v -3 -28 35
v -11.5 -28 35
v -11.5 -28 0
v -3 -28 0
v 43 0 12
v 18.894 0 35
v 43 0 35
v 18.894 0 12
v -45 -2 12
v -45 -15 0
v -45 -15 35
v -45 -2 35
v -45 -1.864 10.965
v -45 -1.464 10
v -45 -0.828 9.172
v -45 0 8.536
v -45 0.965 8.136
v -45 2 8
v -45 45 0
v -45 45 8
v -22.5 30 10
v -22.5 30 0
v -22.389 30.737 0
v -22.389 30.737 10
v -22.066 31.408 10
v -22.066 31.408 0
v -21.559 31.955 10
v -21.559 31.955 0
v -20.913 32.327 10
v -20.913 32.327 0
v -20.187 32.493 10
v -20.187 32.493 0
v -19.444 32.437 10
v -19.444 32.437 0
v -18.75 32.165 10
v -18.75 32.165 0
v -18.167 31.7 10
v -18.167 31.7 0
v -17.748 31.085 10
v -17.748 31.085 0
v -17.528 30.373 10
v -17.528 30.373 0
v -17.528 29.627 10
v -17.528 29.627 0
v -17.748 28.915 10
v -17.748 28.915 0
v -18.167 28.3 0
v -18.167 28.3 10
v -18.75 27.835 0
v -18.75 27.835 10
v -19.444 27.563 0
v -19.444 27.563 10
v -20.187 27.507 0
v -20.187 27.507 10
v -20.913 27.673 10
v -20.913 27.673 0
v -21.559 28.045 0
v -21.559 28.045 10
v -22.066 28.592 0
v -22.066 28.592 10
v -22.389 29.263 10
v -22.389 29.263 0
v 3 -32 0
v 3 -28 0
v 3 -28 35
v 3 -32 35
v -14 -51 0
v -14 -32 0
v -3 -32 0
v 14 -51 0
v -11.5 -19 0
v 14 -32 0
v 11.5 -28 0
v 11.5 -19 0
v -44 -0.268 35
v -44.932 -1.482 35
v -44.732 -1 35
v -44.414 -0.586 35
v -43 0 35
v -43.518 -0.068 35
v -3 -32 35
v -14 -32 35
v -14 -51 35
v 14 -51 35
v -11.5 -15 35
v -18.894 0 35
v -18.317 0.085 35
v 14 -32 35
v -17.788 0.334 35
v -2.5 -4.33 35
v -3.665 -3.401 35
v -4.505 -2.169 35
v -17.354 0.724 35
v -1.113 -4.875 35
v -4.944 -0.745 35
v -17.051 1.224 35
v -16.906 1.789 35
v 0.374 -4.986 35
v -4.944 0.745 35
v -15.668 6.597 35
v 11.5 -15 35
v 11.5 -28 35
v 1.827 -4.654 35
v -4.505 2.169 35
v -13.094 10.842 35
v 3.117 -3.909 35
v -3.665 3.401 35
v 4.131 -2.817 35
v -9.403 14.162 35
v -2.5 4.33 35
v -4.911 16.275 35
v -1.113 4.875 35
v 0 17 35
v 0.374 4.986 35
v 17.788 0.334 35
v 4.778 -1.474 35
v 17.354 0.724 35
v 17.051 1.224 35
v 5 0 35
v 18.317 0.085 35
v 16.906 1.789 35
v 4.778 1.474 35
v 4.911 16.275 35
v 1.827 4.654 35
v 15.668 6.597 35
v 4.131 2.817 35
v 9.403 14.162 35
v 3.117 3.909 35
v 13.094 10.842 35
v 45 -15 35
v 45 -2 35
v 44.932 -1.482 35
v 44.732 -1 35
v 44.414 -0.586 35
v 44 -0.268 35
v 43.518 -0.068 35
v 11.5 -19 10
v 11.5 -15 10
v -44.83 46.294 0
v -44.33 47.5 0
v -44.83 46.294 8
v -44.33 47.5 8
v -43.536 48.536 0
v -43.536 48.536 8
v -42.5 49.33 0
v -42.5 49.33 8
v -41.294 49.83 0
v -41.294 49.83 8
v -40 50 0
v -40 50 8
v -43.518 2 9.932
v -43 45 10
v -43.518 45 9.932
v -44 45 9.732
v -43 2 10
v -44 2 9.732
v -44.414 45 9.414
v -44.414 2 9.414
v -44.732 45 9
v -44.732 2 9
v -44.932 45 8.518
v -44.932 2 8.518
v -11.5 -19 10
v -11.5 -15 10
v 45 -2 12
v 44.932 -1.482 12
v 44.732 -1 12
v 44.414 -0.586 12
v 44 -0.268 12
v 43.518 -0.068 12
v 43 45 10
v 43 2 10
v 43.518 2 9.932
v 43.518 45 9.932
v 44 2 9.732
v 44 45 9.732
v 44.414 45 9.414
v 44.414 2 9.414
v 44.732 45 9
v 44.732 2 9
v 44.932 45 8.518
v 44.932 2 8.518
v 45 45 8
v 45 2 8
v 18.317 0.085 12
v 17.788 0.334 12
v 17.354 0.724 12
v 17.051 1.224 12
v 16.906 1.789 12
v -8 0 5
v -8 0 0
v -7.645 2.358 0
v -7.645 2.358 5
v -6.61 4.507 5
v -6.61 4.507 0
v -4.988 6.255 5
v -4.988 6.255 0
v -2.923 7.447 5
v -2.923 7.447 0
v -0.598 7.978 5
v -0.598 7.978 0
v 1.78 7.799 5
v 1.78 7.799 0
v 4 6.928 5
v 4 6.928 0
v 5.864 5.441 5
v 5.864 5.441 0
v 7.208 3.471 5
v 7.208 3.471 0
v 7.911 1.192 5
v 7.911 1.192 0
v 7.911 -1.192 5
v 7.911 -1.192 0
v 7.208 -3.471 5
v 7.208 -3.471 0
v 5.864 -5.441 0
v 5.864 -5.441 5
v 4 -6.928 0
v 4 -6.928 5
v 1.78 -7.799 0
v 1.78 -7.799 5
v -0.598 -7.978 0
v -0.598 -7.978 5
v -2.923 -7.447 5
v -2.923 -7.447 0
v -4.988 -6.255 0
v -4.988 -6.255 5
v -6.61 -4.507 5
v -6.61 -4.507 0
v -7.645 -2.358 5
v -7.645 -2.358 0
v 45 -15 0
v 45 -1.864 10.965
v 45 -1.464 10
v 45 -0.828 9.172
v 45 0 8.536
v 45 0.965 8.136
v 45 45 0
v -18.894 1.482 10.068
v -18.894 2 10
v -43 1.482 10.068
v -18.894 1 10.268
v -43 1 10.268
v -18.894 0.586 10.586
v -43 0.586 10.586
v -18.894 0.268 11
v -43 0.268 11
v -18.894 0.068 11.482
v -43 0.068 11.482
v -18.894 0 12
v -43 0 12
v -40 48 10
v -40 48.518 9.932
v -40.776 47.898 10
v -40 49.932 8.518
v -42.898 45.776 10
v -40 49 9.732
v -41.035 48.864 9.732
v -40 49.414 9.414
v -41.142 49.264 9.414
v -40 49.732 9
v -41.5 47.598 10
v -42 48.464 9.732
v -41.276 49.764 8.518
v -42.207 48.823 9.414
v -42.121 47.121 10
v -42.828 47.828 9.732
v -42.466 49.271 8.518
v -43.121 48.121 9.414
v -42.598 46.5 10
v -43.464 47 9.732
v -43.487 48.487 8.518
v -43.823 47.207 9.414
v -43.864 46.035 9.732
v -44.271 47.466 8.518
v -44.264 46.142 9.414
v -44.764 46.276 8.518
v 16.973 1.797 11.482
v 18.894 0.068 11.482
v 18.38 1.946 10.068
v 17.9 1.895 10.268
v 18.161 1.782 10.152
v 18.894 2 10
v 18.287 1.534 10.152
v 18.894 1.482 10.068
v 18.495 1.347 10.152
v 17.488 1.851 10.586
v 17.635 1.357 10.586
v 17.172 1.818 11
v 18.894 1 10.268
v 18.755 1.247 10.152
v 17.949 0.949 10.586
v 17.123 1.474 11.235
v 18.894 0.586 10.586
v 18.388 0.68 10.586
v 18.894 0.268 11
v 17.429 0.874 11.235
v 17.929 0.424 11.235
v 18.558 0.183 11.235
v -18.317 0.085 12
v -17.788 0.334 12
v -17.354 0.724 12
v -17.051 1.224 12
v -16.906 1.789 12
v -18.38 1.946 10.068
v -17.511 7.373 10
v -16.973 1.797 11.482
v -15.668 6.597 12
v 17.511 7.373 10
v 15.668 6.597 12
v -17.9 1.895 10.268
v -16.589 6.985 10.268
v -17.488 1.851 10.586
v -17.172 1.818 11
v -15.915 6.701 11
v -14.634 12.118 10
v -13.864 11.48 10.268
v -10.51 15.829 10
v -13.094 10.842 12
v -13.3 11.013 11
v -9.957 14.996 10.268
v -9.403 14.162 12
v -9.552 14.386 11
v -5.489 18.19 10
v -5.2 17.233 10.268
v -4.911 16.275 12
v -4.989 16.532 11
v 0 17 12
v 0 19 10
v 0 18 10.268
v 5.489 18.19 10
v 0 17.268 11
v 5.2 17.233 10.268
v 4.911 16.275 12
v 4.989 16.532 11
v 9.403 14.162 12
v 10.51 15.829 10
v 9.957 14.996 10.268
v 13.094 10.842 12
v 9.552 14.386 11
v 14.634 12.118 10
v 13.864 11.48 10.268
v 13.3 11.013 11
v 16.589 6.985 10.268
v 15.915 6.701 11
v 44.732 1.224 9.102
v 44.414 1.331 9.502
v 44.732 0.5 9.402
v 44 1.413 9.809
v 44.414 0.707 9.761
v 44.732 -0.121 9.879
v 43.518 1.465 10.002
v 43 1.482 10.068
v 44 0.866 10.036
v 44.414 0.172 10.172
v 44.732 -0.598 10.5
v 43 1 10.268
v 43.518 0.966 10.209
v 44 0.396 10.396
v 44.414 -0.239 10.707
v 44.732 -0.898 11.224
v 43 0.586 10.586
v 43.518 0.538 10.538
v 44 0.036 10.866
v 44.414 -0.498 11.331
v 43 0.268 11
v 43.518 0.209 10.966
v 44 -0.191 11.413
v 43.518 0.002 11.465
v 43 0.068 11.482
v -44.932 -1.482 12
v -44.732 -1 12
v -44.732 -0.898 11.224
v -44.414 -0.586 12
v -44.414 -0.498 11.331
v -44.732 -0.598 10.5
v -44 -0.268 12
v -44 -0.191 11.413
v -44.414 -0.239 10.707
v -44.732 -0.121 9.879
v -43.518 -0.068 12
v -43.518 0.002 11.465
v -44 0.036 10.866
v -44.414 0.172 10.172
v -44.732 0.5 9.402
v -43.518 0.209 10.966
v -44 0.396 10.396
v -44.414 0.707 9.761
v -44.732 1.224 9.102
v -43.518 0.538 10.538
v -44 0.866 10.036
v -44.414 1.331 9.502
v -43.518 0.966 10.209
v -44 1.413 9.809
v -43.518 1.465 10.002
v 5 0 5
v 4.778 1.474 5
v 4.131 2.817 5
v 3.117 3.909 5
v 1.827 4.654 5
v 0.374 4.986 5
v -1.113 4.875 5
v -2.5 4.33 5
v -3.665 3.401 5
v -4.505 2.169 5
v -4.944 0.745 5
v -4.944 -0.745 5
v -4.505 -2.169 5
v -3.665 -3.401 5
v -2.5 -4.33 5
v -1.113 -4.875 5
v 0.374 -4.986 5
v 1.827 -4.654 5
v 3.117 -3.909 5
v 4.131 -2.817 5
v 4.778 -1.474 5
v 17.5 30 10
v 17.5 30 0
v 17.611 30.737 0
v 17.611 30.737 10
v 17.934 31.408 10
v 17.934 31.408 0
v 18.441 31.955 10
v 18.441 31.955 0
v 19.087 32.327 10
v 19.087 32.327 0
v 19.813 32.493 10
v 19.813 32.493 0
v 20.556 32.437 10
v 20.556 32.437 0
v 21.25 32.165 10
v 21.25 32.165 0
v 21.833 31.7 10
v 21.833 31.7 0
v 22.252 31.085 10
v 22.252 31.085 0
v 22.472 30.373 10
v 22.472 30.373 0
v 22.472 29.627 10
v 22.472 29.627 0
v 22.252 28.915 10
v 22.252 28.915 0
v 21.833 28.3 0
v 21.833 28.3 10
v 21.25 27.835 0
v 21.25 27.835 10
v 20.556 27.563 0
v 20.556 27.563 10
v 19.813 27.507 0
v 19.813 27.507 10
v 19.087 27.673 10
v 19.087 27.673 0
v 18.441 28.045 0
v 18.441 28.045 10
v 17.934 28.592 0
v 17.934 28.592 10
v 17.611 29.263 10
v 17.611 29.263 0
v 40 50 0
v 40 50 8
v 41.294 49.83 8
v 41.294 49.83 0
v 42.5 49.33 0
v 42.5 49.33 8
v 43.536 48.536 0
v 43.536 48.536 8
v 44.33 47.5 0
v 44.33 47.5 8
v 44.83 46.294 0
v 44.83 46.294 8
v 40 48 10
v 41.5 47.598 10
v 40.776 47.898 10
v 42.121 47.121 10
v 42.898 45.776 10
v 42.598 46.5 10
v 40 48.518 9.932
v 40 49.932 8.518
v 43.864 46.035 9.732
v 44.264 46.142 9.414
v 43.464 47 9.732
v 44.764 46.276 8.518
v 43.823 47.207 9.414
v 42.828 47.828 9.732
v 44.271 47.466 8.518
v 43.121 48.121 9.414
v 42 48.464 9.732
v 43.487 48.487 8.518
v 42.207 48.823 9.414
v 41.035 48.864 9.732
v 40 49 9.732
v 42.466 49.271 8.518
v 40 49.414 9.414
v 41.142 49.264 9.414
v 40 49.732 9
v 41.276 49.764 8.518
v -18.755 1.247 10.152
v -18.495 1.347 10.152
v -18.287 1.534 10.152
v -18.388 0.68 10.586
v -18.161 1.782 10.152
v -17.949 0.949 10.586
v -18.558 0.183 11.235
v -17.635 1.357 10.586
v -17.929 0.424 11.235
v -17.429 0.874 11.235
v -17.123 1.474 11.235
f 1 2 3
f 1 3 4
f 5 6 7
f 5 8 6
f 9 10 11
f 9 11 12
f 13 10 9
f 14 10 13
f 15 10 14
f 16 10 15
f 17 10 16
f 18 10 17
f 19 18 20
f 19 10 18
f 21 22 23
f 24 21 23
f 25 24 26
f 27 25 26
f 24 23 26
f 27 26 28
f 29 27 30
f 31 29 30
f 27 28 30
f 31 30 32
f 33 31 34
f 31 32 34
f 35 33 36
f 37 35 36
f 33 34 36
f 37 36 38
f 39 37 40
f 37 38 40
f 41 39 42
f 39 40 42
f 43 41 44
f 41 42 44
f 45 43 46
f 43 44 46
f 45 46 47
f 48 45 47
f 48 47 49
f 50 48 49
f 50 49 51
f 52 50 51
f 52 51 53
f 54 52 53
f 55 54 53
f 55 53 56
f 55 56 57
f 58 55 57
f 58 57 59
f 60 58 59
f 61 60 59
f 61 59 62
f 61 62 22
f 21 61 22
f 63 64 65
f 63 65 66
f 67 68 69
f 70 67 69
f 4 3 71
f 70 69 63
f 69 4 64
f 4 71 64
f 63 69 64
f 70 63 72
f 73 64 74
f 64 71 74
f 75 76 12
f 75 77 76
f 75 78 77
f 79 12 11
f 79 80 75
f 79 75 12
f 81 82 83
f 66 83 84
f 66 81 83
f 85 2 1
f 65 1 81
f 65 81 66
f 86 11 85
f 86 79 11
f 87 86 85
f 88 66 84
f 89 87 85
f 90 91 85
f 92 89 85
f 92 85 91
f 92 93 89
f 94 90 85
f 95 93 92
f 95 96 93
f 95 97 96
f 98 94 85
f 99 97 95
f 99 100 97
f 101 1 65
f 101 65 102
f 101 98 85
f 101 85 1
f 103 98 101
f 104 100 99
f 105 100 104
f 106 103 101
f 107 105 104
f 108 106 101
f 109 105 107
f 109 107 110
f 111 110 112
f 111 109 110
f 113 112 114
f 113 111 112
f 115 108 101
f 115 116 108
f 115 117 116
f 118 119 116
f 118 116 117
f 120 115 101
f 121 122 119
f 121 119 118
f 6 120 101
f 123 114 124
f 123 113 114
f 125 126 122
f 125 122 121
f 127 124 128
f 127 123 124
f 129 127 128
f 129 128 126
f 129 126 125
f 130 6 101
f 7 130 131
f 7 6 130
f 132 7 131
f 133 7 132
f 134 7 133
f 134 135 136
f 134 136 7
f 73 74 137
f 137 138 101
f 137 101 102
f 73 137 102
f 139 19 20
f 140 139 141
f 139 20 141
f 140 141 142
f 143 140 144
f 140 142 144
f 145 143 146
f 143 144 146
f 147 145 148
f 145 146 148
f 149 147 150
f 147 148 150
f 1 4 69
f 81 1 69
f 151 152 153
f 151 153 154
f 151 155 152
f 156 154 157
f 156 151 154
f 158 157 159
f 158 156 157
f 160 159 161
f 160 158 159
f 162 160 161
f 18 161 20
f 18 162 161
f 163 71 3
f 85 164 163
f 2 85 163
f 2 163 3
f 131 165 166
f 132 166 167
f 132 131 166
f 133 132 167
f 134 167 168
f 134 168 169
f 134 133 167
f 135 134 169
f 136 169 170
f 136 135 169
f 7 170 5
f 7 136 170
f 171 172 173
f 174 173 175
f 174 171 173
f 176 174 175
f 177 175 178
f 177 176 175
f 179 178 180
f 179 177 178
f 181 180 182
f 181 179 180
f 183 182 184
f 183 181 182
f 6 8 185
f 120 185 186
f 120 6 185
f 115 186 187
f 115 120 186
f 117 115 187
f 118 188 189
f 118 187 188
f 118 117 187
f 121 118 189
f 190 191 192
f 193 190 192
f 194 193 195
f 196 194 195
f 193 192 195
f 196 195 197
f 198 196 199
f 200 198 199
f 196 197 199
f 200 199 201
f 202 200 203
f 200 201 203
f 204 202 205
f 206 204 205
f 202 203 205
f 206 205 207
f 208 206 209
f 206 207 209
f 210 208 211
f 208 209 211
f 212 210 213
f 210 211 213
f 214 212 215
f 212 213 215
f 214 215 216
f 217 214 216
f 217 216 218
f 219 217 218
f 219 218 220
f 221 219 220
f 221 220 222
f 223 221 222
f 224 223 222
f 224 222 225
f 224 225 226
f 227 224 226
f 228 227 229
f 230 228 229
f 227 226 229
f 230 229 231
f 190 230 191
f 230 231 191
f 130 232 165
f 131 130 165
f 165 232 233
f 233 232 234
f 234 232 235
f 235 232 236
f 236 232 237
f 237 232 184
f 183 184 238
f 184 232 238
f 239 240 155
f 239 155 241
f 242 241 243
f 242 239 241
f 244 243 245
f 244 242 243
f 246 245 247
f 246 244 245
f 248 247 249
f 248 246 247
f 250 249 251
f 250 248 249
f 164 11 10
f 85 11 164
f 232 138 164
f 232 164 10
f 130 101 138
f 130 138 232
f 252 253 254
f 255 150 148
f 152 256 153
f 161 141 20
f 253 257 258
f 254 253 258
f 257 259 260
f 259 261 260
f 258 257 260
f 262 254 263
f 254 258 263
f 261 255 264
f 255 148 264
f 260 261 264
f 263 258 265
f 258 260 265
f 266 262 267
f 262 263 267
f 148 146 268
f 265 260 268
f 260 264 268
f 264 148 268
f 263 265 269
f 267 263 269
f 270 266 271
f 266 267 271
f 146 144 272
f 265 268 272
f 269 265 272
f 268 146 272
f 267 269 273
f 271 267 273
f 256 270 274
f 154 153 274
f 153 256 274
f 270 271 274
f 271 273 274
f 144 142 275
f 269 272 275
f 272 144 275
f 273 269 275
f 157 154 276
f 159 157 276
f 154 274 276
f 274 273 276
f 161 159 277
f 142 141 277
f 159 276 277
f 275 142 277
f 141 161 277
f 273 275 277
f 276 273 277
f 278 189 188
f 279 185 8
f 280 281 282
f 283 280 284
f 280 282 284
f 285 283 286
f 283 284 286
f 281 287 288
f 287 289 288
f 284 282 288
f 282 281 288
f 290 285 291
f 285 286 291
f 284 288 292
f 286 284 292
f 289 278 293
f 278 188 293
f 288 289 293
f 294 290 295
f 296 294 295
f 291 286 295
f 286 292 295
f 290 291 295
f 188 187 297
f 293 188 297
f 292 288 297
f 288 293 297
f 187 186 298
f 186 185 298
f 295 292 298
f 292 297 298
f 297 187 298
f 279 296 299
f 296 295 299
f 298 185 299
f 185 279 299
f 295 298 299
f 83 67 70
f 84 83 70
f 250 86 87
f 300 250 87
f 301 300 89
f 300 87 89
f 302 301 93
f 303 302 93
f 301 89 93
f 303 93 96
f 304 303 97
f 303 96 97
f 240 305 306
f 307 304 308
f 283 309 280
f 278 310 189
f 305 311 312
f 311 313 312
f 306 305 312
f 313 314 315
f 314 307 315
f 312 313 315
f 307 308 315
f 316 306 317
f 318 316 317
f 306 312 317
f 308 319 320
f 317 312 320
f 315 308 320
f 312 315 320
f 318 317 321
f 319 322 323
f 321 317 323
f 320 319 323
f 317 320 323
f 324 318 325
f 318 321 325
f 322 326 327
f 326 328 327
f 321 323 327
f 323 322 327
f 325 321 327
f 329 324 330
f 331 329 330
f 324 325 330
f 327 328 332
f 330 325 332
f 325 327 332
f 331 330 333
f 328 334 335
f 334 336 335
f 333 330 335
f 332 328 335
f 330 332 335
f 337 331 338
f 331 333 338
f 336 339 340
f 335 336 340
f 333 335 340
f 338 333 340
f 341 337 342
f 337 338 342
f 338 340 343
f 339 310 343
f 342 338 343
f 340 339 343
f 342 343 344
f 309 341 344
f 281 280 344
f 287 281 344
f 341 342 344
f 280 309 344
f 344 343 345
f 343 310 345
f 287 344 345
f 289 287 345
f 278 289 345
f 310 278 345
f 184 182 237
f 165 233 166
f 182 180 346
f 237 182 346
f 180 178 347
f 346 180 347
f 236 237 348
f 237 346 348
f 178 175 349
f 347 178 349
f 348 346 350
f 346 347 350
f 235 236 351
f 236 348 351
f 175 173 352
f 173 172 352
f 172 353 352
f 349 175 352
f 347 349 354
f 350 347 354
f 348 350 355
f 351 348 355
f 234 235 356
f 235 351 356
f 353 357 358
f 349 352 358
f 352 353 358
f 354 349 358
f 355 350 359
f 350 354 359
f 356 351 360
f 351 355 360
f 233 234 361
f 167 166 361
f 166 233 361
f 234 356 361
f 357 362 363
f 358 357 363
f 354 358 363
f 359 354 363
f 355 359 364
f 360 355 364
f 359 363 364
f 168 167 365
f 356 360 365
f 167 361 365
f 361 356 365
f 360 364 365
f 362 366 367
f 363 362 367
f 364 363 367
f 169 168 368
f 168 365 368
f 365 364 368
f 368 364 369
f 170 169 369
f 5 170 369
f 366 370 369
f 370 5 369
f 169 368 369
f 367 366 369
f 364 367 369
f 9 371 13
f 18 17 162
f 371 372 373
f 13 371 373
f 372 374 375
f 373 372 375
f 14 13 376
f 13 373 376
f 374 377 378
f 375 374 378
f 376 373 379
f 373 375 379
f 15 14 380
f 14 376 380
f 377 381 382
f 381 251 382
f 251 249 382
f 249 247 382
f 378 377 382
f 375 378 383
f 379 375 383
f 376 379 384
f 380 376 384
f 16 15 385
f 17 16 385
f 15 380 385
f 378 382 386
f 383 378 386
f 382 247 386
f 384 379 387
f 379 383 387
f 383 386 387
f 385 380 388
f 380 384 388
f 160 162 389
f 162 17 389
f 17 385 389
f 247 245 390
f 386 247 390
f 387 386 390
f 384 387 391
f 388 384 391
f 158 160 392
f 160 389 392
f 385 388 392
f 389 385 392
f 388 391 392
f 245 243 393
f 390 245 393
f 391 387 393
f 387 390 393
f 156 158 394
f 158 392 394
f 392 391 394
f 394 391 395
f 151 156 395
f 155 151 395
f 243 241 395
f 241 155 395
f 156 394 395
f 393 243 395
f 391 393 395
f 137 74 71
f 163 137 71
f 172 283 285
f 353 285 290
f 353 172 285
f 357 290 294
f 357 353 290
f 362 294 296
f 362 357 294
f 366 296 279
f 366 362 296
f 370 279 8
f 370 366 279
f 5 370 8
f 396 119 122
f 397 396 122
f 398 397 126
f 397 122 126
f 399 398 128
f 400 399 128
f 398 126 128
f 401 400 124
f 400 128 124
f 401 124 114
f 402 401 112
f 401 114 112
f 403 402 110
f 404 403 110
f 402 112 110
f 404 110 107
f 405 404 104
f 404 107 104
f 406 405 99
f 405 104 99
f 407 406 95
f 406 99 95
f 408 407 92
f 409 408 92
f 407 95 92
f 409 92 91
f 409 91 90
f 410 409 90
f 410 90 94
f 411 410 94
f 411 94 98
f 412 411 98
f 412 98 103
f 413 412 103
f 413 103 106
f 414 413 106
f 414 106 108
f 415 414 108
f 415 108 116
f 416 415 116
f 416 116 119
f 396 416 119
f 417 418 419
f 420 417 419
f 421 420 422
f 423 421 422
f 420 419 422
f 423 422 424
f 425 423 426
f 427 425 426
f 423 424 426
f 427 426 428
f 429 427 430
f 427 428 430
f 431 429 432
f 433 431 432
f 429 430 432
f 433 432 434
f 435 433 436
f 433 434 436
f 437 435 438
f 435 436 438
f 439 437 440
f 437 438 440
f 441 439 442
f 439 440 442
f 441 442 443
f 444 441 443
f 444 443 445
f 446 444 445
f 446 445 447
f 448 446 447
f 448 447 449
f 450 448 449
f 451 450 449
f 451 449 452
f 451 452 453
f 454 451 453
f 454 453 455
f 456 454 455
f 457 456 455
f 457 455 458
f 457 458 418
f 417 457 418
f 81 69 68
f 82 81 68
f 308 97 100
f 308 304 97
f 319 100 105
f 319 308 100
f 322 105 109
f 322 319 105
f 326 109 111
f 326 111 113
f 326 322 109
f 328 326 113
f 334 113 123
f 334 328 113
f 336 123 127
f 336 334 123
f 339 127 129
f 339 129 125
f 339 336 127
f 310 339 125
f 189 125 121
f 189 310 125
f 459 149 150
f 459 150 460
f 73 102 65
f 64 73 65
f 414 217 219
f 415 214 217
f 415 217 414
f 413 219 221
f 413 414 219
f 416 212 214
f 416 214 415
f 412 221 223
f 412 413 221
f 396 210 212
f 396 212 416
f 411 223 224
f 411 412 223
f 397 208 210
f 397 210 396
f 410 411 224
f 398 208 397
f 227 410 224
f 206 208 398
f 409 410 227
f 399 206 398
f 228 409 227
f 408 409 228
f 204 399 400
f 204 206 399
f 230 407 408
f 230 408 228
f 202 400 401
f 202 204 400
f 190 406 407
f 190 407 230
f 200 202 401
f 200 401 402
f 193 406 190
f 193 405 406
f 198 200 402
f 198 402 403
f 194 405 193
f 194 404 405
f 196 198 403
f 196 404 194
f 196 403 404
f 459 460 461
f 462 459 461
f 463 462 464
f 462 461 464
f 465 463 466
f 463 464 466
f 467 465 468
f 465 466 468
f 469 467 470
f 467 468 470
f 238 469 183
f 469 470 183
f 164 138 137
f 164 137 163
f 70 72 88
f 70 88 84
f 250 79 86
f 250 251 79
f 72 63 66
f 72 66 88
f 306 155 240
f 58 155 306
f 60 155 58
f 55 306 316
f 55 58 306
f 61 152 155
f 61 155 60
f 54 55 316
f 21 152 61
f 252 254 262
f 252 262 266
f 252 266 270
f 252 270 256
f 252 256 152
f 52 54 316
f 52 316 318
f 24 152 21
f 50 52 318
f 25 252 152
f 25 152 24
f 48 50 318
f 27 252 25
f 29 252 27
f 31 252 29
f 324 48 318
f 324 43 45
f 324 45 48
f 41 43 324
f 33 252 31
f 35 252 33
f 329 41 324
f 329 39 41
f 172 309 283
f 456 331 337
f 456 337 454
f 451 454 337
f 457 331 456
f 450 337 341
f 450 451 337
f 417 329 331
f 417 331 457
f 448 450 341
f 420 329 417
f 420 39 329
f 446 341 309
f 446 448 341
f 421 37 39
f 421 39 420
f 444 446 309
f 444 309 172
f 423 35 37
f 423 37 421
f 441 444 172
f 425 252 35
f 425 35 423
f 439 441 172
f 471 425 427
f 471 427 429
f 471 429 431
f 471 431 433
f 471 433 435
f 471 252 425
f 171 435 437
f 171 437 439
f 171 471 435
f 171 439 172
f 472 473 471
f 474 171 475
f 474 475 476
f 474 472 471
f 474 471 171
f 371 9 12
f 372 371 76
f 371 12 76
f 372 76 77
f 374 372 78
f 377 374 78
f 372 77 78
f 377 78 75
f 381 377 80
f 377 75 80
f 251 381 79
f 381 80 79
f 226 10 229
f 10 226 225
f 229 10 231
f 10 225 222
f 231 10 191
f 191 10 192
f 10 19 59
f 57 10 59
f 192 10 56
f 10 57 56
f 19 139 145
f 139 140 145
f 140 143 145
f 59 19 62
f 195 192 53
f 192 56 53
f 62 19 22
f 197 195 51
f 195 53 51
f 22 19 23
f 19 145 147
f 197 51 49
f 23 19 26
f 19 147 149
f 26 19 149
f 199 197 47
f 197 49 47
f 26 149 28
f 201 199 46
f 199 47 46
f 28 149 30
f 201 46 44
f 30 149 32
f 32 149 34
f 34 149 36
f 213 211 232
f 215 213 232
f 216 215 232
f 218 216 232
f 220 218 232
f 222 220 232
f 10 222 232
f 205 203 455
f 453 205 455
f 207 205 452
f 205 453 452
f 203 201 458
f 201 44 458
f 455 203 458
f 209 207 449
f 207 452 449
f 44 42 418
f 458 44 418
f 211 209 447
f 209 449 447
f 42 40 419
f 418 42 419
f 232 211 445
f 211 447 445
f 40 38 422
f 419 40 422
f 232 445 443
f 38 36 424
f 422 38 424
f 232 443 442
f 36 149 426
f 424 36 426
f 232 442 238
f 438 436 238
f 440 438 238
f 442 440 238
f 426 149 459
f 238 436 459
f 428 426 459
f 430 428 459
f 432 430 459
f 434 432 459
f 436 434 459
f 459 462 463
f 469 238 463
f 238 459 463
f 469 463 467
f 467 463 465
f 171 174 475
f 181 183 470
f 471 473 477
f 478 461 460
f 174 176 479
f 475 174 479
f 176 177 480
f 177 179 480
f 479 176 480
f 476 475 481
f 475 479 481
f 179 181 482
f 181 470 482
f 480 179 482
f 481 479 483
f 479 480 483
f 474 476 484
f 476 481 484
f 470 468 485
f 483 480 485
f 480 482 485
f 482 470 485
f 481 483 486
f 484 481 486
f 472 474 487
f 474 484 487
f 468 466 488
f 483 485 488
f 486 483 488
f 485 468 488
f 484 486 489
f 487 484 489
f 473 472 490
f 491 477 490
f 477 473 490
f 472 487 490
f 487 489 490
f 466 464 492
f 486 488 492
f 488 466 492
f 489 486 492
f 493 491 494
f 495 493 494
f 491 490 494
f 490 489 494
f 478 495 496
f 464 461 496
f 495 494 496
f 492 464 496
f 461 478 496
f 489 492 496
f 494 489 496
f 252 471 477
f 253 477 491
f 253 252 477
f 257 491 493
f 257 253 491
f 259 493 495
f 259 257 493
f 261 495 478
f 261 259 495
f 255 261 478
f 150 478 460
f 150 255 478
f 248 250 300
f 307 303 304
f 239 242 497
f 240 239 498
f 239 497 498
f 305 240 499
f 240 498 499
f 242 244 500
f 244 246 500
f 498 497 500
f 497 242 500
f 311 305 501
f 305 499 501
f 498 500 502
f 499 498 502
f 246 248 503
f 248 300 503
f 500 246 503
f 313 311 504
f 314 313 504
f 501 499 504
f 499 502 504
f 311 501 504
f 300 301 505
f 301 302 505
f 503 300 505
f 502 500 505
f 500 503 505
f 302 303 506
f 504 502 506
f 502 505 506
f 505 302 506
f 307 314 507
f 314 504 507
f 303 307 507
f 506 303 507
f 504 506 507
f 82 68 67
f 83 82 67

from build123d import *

# Parameters (mm, degrees)
SKETCH_2_W          = 90
SKETCH_2_H          = 101
EXTRUDE_1_DEPTH     = 35
CUT_EXTRUDE_START   = 10
CUT_EXTRUDE_1_DEPTH = 67.491829629
SKETCH_8_R          = 5
CUT_EXTRUDE_3_DEPTH = 77.491829629
SKETCH_9_W          = 23
SKETCH_9_H          = 4
CUT_EXTRUDE_4_DEPTH = 10
HOLE_WIZARD_M5_1_D  = 5
SKETCH_12_R         = 8
CUT_EXTRUDE_5_DEPTH = 5
FILLET_3_R          = 5
FILLET_4_R          = 2


with BuildPart() as part:
    # 草图2 → 凸台-拉伸1 (new body)
    with BuildSketch(Plane.XY):
        with Locations((0, -0.5)):
            Rectangle(SKETCH_2_W, SKETCH_2_H)
    extrude(amount=EXTRUDE_1_DEPTH)

    # 草图3 → 切除-拉伸1 (cut, through all)
    with BuildSketch(Plane.XY.offset(CUT_EXTRUDE_START)):
        with BuildLine():
            Line((45, 50), (-45, 50))
            Line((-45, 50), (-45, 0))
            Line((-45, 0), (-17, 0))
            ThreePointArc((-17, 0), (0, 17), (17, 0))
            Line((17, 0), (45, 0))
            Line((45, 0), (45, 50))
        make_face()
    extrude(amount=CUT_EXTRUDE_1_DEPTH, mode=Mode.SUBTRACT)

    # 草图8 → 切除-拉伸3 (cut, through all)
    with BuildSketch(Plane.XY.offset(35)):
        Circle(SKETCH_8_R)
        Polygon((-45, -15), (-11.5, -15), (-11.5, -28), (-3, -28), (-3, -32), (-14, -32), (-14, -51), (-45, -51), align=None)
        Polygon((45, -51), (45, -15), (11.5, -15), (11.5, -28), (3, -28), (3, -32), (14, -32), (14, -51), align=None)
    extrude(amount=-CUT_EXTRUDE_3_DEPTH, mode=Mode.SUBTRACT)

    # 草图9 → 切除-拉伸4 (cut)
    with BuildSketch(Plane(origin=(0, 0, 0), x_dir=(-1, 0, 0), z_dir=(0, 0, -1))):
        with Locations((0, -17)):
            Rectangle(SKETCH_9_W, SKETCH_9_H)
    extrude(amount=-CUT_EXTRUDE_4_DEPTH, mode=Mode.SUBTRACT)

    # M5 螺纹孔1 (through all)
    with Locations(Plane.XY.offset(10)):
        with Locations((-20, 30), (20, 30)):
            Hole(HOLE_WIZARD_M5_1_D / 2)

    # 草图12 → 切除-拉伸5 (cut)
    with BuildSketch(Plane(origin=(0, 0, 0), x_dir=(-1, 0, 0), z_dir=(0, 0, -1))):
        Circle(SKETCH_12_R)
    extrude(amount=-CUT_EXTRUDE_5_DEPTH, mode=Mode.SUBTRACT)

    # 圆角3
    fillet_3_edges = [part.edges().sort_by_distance(p)[0] for p in [
        (-45, 50, 5),
        (45, 50, 5),
    ]]
    fillet(fillet_3_edges, radius=FILLET_3_R)

    # 圆角4
    fillet_4_edges = [part.edges().sort_by_distance(p)[0] for p in [
        (0, 50, 10),
        (-45, 22.5, 10),
        (-43.535533906, 48.535533906, 10),
        (43.535533906, 48.535533906, 10),
        (45, 22.5, 10),
        (45, 0, 22.5),
        (-31, 0, 10),
        (-45, 0, 22.5),
        (0, 17, 10),
        (-17, 0, 22.5),
        (31, 0, 10),
        (17, 0, 22.5),
    ]]
    fillet(fillet_4_edges, radius=FILLET_4_R)


solid = part.part
